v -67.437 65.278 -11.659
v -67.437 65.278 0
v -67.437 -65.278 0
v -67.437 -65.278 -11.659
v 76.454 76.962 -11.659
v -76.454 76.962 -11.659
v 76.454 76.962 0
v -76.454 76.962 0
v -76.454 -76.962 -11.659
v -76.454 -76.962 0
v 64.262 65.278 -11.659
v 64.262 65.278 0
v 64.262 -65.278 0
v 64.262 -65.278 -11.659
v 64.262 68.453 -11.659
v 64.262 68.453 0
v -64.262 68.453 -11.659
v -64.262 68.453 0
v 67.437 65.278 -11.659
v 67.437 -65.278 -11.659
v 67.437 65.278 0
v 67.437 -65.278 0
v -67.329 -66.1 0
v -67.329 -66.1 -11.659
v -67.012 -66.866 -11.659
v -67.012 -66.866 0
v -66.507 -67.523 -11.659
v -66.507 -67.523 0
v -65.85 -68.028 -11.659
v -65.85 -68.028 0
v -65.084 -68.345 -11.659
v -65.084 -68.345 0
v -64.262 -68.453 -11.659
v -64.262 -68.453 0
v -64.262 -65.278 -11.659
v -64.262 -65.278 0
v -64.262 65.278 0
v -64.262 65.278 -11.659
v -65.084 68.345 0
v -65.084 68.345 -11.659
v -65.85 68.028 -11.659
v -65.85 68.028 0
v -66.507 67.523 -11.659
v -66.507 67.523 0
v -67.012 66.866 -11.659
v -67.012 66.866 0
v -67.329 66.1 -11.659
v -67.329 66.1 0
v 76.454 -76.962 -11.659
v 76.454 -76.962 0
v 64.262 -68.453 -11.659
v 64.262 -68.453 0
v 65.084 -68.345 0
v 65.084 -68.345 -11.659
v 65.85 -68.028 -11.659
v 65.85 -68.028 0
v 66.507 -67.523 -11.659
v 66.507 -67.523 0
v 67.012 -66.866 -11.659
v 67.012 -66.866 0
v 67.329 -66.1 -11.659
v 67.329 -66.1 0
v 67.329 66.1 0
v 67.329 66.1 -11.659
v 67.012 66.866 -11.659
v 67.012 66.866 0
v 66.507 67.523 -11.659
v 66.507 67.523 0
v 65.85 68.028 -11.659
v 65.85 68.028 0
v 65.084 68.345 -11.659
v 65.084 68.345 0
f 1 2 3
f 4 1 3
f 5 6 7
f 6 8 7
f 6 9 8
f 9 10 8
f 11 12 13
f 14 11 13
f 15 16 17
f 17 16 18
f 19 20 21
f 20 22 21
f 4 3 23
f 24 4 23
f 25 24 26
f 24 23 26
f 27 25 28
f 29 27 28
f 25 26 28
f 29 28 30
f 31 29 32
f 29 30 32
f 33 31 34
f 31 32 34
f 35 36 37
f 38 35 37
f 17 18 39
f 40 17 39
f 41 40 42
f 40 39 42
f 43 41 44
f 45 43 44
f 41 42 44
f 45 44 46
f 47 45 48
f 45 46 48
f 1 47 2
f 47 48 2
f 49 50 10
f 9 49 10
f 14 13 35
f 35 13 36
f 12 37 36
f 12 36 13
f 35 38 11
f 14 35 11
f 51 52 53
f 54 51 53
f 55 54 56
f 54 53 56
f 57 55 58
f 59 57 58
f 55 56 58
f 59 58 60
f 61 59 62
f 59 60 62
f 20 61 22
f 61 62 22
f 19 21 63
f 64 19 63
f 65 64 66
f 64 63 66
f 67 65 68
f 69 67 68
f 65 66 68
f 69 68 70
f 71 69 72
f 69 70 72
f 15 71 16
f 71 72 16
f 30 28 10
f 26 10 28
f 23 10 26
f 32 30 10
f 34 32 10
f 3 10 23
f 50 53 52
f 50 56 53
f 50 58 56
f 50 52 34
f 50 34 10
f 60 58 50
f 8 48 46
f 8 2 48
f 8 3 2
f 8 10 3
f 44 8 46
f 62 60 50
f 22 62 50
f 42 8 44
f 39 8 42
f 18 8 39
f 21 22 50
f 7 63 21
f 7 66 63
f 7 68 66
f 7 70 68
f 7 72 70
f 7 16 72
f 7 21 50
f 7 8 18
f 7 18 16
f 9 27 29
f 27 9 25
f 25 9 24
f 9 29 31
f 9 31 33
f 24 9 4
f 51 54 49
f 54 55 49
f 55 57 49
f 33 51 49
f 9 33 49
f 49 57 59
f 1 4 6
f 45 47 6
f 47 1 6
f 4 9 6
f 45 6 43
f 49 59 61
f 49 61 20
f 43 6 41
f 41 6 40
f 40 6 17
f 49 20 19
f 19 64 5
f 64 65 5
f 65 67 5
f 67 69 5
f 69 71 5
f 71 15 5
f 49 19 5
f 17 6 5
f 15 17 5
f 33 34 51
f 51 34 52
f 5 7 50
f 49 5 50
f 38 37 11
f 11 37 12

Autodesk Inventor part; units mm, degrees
ref_plane "YZ Plane" through (0, 0, 0) normal (1, 0, 0) x (0, 1, 0)
ref_plane "XZ Plane" through (0, 0, 0) normal (0, 1, 0) x (-1, 0, 0)
ref_plane "XY Plane" through (0, 0, 0) normal (0, 0, 1) x (1, 0, 0)
sketch "Sketch1" plane through (0, 0, 0) normal (0, 0, 1) x (1, 0, 0)
  line L0 (64.262, -65.278) -> (-64.262, -65.278)
  line L1 (-64.262, -65.278) -> (-64.262, 65.278)
  line L2 (-64.262, 65.278) -> (64.262, 65.278)
  line L3 (64.262, 65.278) -> (64.262, -65.278)
  line L4 (76.454, -76.962) -> (-76.454, -76.962)
  line L5 (-76.454, -76.962) -> (-76.454, 76.962)
  line L6 (-76.454, 76.962) -> (76.454, 76.962)
  line L7 (76.454, 76.962) -> (76.454, -76.962)
  line L8 (64.262, 68.453) -> (-64.262, 68.453)
  line L9 (-67.437, 65.278) -> (-67.437, -65.278)
  line L10 (-64.262, -68.453) -> (64.262, -68.453)
  line L11 (67.437, -65.278) -> (67.437, 65.278)
  arc A0 (-64.262, 68.453) -> (-67.437, 65.278) centre (-64.262, 65.278) ccw
  arc A1 (67.437, 65.278) -> (64.262, 68.453) centre (64.262, 65.278) ccw
  arc A2 (64.262, -68.453) -> (67.437, -65.278) centre (64.262, -65.278) ccw
  arc A3 (-67.437, -65.278) -> (-64.262, -68.453) centre (-64.262, -65.278) ccw
  point P0 (0, 0)
  dimension "d0" = 128.524
  dimension "d1" = 130.556
  dimension "d2" = 152.908
  dimension "d3" = 153.924
  dimension "d4" = 3.175
  dimension "d5" = 3.175
extrude "Extrusion1" add sketch "Sketch1" against normal blind 11.6586
properties part number "cy oring"
